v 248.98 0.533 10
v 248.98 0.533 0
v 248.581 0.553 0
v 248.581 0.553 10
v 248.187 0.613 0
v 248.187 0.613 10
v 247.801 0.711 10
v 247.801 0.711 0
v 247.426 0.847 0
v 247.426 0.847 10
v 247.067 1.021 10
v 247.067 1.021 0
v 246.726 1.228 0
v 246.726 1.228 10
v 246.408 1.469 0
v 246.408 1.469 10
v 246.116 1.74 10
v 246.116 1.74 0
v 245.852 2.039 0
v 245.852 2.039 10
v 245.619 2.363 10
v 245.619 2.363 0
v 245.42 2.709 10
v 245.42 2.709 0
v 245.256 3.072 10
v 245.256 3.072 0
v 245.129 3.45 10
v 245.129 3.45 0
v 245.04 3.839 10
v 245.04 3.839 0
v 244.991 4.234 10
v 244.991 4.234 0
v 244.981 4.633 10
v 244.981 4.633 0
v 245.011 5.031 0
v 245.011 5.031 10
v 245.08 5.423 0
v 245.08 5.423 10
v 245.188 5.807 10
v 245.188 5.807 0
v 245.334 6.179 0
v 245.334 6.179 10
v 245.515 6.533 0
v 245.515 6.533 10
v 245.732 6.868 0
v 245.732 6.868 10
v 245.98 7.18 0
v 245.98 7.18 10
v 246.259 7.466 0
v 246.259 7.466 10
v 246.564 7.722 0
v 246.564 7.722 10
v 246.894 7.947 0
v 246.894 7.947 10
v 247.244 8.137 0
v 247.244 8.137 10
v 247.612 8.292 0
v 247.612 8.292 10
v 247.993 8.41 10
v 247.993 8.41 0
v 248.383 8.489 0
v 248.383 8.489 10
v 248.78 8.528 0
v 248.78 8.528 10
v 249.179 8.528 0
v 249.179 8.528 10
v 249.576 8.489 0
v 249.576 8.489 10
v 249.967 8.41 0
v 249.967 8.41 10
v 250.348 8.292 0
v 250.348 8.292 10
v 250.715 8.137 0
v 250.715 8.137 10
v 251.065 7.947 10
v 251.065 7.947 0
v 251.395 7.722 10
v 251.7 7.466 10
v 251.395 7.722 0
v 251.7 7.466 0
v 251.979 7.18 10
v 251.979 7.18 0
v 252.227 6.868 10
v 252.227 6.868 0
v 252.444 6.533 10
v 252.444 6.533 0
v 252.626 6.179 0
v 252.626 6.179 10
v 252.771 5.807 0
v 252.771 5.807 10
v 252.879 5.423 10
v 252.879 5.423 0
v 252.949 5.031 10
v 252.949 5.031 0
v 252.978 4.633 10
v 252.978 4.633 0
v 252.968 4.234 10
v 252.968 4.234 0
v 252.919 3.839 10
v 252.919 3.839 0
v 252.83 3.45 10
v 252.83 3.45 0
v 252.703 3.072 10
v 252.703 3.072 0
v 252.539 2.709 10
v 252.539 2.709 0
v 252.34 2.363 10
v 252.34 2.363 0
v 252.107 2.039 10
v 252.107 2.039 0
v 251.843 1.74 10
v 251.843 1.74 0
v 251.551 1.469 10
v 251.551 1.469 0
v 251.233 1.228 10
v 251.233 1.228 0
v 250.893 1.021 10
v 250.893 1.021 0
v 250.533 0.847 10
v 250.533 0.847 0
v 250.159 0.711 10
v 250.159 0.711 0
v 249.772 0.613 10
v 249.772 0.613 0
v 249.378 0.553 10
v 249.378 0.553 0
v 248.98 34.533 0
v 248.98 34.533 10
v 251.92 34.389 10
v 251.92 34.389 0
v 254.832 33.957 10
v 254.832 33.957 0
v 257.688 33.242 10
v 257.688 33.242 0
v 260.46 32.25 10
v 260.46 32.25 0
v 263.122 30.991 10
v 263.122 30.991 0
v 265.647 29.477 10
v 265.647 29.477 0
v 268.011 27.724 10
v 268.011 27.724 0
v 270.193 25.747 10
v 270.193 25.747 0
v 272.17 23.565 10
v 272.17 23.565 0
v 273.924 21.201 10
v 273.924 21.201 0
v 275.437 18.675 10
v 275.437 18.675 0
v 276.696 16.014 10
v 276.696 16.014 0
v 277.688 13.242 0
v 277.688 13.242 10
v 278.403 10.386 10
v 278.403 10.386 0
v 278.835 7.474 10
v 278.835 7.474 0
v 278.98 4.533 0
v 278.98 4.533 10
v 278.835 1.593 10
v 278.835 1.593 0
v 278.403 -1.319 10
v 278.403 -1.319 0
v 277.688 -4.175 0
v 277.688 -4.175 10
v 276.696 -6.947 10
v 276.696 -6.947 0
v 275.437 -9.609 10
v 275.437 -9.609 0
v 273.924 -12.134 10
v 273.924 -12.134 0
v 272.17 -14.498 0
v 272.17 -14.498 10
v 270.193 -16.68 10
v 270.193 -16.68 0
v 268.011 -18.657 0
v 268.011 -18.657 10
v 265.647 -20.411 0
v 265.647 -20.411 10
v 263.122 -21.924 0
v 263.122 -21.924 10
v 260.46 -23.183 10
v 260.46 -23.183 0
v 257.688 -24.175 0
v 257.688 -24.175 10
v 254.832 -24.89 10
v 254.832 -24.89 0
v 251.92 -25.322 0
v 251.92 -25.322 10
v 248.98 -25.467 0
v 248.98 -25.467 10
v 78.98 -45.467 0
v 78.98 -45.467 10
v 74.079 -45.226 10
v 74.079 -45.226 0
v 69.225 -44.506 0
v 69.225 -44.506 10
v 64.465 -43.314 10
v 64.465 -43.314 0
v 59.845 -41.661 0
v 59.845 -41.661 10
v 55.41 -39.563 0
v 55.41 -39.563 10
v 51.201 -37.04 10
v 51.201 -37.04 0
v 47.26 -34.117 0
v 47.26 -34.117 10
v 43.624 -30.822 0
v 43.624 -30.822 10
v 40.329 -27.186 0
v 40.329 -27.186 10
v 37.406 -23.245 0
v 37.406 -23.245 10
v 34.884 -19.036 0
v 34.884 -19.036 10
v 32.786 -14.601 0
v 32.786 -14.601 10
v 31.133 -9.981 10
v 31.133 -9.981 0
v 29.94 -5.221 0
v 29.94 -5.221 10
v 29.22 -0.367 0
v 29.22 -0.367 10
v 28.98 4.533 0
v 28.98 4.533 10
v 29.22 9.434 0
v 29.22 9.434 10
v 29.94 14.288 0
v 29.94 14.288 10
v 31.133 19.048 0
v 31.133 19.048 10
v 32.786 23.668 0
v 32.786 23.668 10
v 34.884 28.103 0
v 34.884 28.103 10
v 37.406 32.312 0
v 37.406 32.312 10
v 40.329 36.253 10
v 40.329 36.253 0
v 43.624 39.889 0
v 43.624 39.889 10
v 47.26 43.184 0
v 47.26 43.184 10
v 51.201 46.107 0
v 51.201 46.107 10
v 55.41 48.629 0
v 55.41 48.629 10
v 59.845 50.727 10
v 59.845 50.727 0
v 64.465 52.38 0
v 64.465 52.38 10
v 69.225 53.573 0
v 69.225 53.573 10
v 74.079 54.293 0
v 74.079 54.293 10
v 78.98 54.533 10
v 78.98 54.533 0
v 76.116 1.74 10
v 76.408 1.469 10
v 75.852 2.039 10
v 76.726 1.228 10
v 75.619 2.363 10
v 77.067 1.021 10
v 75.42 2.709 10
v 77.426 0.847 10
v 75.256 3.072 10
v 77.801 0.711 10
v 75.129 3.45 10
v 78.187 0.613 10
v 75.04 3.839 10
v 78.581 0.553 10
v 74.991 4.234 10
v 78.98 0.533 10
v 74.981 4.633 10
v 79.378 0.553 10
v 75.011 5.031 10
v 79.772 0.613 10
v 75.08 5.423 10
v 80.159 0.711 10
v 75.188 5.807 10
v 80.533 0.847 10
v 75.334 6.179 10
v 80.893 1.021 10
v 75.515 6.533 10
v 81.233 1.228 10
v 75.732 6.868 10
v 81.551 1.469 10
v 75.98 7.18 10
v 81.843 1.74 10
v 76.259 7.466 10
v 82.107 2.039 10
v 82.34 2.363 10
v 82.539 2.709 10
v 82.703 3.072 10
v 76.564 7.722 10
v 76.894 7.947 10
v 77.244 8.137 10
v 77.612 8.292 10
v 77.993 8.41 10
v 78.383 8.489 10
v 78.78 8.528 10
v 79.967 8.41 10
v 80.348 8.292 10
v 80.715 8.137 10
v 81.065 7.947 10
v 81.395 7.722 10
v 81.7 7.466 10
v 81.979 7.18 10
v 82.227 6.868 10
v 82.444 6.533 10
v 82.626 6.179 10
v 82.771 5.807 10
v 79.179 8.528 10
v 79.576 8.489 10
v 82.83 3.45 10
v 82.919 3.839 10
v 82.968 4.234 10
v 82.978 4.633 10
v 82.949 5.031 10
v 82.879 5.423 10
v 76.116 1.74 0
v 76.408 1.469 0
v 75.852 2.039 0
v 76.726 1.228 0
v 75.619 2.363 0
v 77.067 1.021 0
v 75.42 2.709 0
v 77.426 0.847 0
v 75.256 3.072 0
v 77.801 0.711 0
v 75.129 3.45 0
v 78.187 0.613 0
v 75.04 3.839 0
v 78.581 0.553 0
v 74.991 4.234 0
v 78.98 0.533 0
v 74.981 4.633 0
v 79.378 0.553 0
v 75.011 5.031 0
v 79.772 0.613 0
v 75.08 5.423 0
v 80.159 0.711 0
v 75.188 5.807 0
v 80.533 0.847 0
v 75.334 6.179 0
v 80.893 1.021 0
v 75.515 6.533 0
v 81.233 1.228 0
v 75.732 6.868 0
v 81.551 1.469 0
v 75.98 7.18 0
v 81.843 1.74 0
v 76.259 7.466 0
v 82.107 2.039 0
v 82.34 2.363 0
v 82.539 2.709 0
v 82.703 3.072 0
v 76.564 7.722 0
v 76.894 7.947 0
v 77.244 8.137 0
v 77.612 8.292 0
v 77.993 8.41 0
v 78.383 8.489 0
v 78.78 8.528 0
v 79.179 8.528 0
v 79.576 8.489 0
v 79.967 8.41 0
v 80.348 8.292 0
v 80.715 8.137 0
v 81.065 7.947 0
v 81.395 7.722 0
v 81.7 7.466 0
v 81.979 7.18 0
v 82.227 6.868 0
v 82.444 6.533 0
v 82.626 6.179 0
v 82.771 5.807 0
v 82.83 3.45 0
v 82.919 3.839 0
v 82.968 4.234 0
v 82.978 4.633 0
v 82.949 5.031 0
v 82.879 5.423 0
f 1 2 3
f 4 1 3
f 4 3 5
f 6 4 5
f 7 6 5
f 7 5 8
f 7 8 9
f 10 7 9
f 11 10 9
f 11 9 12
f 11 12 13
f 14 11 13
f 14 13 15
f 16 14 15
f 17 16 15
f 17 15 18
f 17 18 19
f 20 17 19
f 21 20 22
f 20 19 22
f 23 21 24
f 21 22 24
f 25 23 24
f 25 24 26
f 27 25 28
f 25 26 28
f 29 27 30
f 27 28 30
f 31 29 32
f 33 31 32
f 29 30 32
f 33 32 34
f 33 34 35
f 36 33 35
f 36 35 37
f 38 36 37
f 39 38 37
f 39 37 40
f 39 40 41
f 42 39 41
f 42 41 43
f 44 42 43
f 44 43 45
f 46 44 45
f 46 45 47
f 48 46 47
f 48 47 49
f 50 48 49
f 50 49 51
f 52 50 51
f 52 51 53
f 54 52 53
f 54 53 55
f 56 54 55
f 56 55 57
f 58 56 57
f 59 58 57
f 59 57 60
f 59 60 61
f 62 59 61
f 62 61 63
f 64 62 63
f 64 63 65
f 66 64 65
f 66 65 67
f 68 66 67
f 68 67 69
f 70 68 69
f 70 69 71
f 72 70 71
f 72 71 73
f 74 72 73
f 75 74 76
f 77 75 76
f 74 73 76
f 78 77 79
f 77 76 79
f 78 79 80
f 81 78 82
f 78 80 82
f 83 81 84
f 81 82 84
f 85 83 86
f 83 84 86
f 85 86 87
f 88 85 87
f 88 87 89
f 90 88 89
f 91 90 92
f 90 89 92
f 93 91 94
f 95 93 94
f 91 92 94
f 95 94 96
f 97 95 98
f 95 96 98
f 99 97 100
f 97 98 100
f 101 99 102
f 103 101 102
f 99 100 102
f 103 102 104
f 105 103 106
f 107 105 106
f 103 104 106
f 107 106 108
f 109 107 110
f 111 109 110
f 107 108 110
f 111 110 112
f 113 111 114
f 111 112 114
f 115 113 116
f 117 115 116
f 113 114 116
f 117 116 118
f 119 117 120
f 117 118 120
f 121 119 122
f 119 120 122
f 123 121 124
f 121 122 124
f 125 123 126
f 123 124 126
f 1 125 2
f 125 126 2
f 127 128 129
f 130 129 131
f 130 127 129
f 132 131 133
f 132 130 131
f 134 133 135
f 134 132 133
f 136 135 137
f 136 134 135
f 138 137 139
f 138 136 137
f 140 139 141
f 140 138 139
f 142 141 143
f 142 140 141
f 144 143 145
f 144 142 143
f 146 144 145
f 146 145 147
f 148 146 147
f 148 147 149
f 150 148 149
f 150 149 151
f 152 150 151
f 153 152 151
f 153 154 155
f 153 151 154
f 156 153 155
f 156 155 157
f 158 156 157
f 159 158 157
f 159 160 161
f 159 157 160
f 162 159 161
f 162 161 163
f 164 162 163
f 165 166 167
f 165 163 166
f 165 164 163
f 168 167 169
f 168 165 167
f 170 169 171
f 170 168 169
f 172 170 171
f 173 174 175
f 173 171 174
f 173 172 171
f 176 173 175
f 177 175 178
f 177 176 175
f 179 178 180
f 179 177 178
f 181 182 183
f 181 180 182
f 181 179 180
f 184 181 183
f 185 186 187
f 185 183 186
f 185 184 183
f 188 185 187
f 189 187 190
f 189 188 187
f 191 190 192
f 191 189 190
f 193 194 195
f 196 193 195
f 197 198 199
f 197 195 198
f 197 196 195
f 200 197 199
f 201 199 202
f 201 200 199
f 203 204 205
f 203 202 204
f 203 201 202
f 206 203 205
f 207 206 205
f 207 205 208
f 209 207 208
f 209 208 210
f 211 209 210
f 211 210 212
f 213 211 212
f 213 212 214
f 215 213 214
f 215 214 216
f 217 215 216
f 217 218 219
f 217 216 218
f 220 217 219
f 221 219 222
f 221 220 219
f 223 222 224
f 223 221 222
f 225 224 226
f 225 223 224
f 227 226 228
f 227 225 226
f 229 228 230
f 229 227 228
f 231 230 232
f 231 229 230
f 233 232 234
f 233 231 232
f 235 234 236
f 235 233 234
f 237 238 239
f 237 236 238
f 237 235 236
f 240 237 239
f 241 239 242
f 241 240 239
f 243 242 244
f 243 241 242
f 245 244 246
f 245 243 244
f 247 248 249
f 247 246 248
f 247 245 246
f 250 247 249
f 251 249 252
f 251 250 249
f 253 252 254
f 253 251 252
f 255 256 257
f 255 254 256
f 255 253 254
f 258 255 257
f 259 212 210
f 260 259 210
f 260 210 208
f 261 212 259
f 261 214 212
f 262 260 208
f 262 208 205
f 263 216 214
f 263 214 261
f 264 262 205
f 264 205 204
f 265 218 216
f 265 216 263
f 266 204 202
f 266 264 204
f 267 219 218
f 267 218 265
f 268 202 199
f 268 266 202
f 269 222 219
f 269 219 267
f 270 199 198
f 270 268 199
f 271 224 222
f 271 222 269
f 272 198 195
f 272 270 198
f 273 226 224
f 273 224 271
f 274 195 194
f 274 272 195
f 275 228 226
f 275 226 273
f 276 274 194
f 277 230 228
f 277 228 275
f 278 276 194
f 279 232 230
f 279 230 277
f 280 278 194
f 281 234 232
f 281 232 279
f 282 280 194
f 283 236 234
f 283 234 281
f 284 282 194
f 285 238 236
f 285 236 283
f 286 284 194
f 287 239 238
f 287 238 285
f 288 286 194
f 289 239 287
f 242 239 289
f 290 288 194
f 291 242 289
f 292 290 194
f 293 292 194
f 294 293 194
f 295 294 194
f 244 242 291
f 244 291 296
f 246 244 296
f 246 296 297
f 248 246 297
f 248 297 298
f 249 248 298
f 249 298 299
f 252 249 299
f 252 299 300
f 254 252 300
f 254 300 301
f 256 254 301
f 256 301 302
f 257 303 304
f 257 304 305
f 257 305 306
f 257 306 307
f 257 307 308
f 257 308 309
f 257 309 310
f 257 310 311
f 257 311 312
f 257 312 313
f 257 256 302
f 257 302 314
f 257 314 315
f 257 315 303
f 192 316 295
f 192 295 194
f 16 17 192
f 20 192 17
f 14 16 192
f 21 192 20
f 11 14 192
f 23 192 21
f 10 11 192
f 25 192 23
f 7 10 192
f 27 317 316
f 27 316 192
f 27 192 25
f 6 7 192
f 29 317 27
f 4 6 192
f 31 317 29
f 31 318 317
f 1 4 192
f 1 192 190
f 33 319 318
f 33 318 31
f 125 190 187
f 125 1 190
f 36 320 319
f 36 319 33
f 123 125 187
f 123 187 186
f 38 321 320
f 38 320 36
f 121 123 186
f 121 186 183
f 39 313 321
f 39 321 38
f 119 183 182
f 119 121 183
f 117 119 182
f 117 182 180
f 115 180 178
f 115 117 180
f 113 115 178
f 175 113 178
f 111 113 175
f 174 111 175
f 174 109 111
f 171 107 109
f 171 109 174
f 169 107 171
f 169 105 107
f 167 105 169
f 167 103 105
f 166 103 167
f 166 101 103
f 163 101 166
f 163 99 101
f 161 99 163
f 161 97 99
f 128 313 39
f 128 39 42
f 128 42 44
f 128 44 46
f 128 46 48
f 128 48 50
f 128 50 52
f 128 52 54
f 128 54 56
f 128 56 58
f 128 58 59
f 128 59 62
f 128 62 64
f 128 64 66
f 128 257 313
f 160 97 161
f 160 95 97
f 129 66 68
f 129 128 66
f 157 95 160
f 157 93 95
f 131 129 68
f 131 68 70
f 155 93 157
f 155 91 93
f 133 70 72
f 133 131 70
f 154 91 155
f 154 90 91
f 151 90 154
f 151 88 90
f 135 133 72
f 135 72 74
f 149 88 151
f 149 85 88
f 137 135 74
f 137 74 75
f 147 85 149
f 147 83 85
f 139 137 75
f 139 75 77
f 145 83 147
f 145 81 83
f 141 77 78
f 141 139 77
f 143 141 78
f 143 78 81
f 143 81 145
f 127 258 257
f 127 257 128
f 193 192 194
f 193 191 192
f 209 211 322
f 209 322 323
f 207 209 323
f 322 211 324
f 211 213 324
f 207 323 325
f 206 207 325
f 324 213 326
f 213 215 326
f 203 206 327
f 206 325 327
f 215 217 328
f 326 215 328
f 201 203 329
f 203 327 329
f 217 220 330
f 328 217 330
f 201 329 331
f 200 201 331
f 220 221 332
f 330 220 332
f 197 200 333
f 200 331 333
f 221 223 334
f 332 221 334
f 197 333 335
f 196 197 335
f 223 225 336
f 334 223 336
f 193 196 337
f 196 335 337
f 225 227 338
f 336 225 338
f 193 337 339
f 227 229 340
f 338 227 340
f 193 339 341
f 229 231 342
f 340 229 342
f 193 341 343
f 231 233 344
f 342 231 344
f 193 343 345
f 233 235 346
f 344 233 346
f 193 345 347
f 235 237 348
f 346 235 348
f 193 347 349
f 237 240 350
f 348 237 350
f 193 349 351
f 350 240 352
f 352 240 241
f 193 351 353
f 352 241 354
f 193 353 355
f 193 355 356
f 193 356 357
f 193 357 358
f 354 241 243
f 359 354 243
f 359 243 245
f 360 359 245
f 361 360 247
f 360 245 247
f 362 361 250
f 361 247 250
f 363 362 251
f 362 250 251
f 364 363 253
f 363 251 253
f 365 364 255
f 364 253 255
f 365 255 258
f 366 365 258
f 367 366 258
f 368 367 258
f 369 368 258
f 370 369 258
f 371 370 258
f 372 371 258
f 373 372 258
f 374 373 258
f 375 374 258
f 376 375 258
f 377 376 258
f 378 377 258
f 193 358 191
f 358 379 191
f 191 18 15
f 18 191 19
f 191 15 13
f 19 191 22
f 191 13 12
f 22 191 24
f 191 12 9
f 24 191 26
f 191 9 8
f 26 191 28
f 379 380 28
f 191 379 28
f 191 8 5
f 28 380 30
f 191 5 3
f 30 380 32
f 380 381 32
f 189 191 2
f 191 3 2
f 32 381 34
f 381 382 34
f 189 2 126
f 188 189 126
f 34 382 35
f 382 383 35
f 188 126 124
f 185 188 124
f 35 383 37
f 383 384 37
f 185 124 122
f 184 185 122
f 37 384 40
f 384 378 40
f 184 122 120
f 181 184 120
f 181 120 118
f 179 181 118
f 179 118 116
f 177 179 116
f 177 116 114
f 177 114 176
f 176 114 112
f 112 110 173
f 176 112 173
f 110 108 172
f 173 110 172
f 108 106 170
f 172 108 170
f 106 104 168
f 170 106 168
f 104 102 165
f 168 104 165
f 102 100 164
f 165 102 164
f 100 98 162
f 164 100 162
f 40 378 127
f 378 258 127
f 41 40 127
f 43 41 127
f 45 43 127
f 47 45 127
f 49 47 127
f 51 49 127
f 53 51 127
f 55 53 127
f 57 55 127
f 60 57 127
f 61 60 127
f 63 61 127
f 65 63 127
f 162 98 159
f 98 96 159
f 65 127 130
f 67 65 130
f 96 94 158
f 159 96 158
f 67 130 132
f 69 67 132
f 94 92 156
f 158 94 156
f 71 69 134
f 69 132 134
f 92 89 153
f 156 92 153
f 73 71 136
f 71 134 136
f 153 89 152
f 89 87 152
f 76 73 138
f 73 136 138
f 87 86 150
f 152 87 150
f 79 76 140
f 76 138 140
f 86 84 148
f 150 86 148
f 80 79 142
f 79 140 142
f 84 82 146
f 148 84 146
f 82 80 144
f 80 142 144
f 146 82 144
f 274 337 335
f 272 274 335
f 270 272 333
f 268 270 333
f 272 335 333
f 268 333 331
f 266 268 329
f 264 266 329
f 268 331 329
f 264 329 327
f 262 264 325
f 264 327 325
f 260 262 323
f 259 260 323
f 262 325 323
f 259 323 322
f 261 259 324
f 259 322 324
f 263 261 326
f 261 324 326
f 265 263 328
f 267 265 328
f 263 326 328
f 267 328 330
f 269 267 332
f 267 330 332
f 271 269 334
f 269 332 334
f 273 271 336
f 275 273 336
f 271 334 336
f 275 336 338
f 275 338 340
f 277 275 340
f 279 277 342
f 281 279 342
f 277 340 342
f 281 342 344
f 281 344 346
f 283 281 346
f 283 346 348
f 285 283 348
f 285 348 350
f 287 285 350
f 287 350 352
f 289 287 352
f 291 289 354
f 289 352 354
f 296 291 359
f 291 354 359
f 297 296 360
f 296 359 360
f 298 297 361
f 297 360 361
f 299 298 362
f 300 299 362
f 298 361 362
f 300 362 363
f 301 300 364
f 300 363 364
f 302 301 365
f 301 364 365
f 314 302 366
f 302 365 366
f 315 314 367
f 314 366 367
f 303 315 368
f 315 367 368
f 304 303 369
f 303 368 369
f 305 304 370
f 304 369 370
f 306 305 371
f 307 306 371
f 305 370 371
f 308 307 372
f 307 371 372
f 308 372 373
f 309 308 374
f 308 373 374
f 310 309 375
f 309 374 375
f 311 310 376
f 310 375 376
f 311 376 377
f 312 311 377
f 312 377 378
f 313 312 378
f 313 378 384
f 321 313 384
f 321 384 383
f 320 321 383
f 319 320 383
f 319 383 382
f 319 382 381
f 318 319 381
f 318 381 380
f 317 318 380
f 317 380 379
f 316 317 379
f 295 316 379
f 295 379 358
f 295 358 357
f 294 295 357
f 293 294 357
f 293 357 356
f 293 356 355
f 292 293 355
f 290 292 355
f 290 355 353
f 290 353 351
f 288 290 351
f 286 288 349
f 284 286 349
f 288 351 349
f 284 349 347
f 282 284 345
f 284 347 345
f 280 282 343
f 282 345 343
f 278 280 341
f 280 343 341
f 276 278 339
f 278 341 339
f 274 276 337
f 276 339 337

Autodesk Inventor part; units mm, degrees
ref_plane "YZ Plane" through (0, 0, 0) normal (1, 0, 0) x (0, 1, 0)
ref_plane "XZ Plane" through (0, 0, 0) normal (0, 1, 0) x (-1, 0, 0)
ref_plane "XY Plane" through (0, 0, 0) normal (0, 0, 1) x (1, 0, 0)
sketch "Sketch1" plane through (0, 0, 0) normal (0, 0, 1) x (1, 0, 0)
  circle A0 centre (78.9796, 4.5334) radius 50
  circle A1 centre (248.9796, 4.5334) radius 30
  line L0 (78.9796, 54.5334) -> (248.9796, 34.5334)
  line L1 (248.9796, -25.4666) -> (78.9796, -45.4666)
  dimension "d25" = 170
  dimension "d26" = 100
  dimension "d27" = 60
  dimension "d28" = 0
extrude "Extrusion1" add sketch "Sketch1" along normal blind 10 contours L0 A0 L1 | L0 A1 L1 A0 | A1
sketch "Sketch2" plane through (0, 0, 10) normal (0, 0, 1) x (1, 0, 0)
  arc A0 (248.9796, -25.4666) -> (248.9796, 34.5334) centre (248.9796, 4.5334) ccw projected
  arc A1 (78.9796, 54.5334) -> (78.9796, -45.4666) centre (78.9796, 4.5334) ccw projected
hole "Hole1" at (78.9796, 4.5334, 10) at (248.9796, 4.5334, 10) direction (0, 0, -1) diameter 8 end through all
properties part number "short arm"
